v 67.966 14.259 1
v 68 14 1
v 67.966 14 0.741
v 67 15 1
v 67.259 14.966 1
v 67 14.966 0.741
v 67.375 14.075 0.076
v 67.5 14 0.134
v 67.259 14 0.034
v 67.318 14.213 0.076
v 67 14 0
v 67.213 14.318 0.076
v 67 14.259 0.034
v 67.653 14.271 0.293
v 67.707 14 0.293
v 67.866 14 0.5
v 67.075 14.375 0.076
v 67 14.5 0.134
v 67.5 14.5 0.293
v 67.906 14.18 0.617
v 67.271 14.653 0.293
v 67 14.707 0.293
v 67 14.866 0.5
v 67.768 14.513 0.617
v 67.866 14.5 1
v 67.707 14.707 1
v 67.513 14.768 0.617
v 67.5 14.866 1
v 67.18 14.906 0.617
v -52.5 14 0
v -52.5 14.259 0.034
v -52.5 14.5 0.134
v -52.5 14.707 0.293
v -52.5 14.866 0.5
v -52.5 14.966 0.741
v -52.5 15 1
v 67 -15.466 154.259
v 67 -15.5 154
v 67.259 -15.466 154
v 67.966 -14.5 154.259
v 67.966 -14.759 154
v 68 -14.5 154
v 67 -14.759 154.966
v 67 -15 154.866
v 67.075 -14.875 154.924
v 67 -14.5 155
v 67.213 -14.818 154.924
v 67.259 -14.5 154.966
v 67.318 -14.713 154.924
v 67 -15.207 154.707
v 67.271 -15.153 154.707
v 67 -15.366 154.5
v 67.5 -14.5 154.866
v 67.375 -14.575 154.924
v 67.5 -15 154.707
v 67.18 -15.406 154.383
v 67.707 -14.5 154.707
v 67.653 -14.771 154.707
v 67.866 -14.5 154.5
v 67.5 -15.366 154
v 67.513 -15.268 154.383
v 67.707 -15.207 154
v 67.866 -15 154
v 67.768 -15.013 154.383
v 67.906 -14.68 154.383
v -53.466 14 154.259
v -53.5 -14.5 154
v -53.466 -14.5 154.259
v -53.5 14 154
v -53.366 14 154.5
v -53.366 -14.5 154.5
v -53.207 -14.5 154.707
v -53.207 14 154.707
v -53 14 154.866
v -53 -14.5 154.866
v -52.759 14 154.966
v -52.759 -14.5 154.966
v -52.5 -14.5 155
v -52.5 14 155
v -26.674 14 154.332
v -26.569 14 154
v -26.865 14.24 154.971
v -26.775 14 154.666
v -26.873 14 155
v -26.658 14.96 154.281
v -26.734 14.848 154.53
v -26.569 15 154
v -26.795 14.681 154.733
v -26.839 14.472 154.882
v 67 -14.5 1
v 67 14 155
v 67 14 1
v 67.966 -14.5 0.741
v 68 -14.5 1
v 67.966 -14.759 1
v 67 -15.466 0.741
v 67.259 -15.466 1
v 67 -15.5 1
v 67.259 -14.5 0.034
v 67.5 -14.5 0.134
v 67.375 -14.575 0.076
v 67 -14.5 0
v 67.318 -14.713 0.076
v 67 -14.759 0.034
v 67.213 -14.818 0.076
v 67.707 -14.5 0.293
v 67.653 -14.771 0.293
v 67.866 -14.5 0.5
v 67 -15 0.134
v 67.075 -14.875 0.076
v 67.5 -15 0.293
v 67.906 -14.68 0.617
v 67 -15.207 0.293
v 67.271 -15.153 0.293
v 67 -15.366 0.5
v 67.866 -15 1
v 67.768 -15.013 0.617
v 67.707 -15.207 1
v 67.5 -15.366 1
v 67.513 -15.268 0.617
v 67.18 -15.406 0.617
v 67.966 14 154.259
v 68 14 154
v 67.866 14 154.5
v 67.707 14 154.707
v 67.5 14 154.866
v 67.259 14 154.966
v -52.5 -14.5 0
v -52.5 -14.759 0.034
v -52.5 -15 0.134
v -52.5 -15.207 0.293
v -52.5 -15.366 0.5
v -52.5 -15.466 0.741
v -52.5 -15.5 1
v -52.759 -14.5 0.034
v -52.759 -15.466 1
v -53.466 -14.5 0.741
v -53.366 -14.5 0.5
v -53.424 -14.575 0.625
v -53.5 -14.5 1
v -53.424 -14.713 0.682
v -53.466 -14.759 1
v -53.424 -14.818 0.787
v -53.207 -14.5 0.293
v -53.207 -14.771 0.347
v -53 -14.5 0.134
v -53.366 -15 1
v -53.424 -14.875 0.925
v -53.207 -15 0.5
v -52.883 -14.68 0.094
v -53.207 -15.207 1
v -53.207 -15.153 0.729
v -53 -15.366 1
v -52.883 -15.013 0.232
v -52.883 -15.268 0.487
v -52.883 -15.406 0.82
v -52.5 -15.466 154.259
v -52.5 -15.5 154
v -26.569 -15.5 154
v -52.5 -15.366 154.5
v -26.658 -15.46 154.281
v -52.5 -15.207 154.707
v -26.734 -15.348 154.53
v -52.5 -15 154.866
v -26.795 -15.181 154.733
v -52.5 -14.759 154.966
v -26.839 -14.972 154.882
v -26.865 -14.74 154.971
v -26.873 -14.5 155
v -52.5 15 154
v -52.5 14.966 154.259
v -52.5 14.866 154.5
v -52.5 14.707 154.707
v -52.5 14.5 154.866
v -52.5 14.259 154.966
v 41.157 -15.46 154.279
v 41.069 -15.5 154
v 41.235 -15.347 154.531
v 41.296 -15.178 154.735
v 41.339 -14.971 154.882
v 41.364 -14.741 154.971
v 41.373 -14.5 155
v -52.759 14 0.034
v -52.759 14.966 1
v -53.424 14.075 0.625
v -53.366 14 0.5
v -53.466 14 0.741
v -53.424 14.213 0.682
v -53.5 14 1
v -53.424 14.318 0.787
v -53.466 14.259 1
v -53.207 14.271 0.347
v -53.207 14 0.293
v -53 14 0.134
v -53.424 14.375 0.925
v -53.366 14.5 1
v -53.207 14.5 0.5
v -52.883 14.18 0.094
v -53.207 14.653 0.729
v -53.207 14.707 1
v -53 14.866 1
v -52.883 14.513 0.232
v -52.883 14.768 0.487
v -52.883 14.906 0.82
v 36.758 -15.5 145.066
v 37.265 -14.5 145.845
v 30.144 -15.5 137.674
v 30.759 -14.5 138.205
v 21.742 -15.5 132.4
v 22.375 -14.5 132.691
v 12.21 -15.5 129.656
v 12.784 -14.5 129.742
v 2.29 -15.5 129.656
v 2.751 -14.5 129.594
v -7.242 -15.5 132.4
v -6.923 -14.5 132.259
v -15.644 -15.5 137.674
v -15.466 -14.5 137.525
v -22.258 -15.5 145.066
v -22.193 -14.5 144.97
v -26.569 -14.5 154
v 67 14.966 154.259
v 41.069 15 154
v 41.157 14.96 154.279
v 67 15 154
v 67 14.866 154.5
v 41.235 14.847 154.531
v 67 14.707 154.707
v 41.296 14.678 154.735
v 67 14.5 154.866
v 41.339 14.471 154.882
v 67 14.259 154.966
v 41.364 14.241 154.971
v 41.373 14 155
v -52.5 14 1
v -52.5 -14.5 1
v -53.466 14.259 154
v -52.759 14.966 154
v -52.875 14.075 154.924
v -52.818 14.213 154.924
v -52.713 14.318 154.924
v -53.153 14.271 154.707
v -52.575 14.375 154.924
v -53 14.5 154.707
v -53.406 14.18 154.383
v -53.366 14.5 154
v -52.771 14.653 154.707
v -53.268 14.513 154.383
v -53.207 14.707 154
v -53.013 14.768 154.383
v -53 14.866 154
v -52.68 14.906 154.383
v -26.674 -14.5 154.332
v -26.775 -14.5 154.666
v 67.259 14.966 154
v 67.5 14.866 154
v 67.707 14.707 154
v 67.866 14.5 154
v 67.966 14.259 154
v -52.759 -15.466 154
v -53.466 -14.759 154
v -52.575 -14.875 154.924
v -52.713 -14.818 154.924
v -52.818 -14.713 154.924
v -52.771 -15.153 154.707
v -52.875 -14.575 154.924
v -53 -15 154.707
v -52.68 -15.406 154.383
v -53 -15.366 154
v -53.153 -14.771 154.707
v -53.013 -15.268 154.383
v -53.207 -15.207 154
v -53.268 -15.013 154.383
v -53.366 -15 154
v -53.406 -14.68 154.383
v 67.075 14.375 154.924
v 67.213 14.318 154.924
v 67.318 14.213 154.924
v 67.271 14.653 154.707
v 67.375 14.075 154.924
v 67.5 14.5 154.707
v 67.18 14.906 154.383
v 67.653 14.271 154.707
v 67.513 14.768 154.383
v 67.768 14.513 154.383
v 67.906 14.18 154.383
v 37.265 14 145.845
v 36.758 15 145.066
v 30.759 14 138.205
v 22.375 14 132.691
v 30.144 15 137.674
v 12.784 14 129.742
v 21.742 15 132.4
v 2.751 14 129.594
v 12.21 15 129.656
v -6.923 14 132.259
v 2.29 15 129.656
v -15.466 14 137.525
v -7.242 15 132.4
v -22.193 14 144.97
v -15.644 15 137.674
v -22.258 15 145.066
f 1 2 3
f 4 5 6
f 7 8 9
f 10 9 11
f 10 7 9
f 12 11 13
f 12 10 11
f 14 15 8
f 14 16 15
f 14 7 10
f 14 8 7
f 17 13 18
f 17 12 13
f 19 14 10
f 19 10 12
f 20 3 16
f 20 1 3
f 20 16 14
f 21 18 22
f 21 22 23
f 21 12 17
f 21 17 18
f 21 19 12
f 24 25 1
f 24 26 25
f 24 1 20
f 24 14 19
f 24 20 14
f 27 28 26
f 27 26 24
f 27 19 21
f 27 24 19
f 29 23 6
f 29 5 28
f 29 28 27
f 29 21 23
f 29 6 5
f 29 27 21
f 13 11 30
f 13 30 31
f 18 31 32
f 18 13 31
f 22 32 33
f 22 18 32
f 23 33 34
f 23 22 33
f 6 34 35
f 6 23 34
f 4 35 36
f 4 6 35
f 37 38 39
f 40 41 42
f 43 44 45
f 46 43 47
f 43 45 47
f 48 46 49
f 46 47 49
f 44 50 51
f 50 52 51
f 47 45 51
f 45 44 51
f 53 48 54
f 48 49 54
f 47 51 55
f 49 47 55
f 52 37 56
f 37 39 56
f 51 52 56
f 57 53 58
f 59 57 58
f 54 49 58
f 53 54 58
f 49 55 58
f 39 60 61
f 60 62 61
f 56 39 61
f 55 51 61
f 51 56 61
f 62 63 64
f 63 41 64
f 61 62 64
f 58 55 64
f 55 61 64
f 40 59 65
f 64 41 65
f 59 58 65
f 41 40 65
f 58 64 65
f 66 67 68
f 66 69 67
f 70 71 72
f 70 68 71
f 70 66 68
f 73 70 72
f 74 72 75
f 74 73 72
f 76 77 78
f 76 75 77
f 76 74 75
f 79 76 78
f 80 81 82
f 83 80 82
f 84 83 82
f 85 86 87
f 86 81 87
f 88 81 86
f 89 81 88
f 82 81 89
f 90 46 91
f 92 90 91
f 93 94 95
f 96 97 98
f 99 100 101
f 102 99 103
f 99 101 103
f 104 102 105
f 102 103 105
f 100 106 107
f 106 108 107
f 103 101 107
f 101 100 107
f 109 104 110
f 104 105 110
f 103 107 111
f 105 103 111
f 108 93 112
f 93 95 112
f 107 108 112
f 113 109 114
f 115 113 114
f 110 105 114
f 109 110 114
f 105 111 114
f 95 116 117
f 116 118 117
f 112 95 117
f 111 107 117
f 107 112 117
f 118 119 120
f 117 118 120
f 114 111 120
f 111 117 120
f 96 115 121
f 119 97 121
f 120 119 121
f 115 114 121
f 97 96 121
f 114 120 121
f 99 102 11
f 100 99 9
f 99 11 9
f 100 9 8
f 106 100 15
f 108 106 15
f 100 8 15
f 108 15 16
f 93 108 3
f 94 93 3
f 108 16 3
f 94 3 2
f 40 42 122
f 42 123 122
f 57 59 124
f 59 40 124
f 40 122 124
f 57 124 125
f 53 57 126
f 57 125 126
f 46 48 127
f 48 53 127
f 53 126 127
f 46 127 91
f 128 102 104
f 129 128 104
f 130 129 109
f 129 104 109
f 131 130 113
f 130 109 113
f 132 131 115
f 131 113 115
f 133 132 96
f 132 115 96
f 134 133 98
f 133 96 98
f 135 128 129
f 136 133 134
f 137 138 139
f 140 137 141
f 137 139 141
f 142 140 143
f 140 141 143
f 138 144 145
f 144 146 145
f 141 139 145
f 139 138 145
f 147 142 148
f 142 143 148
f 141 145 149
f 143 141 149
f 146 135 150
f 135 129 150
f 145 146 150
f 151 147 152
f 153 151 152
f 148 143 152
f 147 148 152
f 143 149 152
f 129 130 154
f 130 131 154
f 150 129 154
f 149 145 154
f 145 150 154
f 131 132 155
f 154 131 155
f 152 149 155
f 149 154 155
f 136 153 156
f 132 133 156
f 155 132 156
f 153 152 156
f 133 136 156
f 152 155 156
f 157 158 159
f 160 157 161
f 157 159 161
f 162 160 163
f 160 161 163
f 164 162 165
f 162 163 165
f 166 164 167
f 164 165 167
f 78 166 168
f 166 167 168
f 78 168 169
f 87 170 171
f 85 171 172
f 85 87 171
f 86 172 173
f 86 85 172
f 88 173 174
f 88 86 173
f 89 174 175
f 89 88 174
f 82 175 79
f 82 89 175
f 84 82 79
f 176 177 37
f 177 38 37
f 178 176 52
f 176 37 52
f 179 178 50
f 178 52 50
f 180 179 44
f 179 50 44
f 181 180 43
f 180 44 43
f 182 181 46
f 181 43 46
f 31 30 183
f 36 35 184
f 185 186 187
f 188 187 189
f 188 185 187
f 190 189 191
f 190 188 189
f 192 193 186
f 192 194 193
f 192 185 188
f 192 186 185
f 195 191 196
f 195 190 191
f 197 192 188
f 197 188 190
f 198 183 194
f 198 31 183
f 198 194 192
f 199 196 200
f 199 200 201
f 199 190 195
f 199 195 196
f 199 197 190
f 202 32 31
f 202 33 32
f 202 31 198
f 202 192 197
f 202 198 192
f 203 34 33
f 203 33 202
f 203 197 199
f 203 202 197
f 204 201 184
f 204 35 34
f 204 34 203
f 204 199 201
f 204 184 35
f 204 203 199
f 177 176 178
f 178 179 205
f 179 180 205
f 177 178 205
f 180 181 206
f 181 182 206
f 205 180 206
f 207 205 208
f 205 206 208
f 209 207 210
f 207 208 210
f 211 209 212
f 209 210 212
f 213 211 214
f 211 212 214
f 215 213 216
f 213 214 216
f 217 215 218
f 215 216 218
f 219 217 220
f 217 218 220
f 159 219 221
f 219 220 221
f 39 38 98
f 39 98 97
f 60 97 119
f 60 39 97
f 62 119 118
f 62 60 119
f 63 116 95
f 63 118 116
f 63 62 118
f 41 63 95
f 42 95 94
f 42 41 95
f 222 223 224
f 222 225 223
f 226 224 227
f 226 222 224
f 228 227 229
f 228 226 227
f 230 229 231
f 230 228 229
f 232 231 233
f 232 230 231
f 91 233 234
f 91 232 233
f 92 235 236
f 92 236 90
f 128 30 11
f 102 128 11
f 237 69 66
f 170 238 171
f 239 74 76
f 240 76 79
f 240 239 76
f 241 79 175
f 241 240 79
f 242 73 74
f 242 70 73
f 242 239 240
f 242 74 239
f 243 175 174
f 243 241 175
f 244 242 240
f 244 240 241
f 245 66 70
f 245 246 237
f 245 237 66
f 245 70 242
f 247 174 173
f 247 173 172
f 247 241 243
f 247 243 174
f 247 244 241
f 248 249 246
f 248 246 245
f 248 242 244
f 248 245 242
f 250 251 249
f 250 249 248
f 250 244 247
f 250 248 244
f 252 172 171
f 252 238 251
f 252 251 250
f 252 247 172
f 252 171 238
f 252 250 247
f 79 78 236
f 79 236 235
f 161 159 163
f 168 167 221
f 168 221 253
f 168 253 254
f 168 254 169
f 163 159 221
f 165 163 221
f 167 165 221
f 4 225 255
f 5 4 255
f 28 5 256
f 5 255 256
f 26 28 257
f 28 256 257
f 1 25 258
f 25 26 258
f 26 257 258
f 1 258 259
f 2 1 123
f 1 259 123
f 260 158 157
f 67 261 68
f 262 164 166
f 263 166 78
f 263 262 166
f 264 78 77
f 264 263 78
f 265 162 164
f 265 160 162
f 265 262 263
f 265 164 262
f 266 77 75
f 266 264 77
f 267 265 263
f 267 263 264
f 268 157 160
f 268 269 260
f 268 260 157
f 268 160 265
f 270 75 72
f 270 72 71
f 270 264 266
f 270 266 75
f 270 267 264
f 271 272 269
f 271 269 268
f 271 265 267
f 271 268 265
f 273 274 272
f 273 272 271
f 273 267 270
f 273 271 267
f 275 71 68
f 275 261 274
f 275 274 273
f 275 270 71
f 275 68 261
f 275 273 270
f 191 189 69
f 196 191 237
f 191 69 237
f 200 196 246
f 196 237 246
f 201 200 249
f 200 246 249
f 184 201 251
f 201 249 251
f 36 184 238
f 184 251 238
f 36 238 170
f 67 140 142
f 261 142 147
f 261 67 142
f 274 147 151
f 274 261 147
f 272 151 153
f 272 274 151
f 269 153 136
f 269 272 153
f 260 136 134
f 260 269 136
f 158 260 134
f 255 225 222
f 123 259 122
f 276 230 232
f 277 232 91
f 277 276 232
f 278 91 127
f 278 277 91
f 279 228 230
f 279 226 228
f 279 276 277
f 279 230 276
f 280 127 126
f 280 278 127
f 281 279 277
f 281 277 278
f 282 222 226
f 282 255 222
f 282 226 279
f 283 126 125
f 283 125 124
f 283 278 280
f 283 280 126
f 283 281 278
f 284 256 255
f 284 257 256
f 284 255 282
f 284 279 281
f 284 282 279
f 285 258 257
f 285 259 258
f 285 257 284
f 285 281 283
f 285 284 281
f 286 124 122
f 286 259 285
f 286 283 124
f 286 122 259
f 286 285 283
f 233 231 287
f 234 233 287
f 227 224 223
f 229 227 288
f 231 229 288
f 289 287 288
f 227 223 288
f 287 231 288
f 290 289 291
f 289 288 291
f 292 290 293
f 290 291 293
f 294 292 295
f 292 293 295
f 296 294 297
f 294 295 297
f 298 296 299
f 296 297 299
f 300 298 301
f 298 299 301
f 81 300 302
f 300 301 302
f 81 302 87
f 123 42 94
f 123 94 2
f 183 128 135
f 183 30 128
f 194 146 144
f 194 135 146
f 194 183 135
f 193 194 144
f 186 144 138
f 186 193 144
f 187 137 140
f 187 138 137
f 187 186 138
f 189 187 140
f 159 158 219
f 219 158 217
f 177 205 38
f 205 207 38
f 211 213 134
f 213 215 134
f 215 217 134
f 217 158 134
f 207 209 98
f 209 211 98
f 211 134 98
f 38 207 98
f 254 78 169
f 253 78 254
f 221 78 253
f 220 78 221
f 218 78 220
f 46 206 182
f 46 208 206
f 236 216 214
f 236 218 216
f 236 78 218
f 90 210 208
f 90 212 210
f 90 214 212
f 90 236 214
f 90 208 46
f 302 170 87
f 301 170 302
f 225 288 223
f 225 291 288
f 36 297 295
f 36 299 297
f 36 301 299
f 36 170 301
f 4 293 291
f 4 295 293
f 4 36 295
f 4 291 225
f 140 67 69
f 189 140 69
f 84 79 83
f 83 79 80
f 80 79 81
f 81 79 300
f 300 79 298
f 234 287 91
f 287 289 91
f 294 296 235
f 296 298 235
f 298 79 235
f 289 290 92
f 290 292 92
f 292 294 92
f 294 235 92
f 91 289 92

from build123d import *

# Parameters (mm, degrees)
F0_W     = 121.5
F0_H     = 30.5
F0_W_2   = 119.5
F0_H_2   = 28.5
F1_DEPTH = 155
F2_DEPTH = 1
F3_R     = 0.99999
F5_DEPTH = 30.5


# Not quite as in the source:
# - a fillet or chamfer is up to 0.001 mm smaller than in the source, because OpenCascade refuses the exact size


with BuildPart() as f1:
    # F0 (on Top) → F1 (new body)
    with BuildSketch(Plane.XY):
        with Locations((7.2500004172, -0.2499995828)):
            Rectangle(F0_W, F0_H)
        with Locations((7.2500004172, -0.2499995828)):
            Rectangle(F0_W_2, F0_H_2, mode=Mode.SUBTRACT)
    extrude(amount=F1_DEPTH)

    # F0 (on Top) → F2 (join)
    with BuildSketch(Plane.XY):
        with Locations((7.2500004172, -0.2499995828)):
            Rectangle(F0_W_2, F0_H_2)
    extrude(amount=F2_DEPTH)

    # F3 (radius 1 in the source; OpenCascade refuses exactly that, so slightly less here)
    f3_edges = [f1.edges().sort_by_distance(p)[0] for p in [
        (68, -15.5, 77.5),
        (68, 15, 77.5),
        (68, -0.25, 0),
        (7.25, 15, 0),
        (7.25, -15.5, 0),
        (-53.5, -0.25, 0),
        (-53.5, -15.5, 77.5),
        (-53.5, 15, 77.5),
        (7.25, -15.5, 155),
        (-53.5, -0.25, 155),
        (7.25, 15, 155),
        (68, -0.25, 155),
    ]]
    fillet(f3_edges, radius=F3_R)

    # F4 (on face) → F5 (cut, through all)
    with BuildSketch(Plane(origin=(0, 15.0000004172, 0), x_dir=(-1, 0, 0), z_dir=(0, 1, 0))):
        with BuildLine():
            ThreePointArc((26.5693810998, 154.00001), (27.8320116519, 159.3416659555), (28.2562680656, 164.8140996695))
            ThreePointArc((28.2562680656, 164.8140996695), (-12.7224341312, 199.8961117386), (-41.0693819342, 154.00001))
            Line((-41.0693819342, 154.00001), (-7.2500004172, 154.00001))
            Line((-7.2500004172, 154.00001), (26.5693810998, 154.00001))
        make_face()
        with BuildLine():
            Line((-7.2500004172, 154.00001), (-41.0693819342, 154.00001))
            ThreePointArc((-41.0693819342, 154.00001), (-7.2500004172, 129.3078311867), (26.5693810998, 154.00001))
            Line((26.5693810998, 154.00001), (-7.2500004172, 154.00001))
        make_face()
    extrude(amount=-F5_DEPTH, mode=Mode.SUBTRACT)


solid = f1.part
